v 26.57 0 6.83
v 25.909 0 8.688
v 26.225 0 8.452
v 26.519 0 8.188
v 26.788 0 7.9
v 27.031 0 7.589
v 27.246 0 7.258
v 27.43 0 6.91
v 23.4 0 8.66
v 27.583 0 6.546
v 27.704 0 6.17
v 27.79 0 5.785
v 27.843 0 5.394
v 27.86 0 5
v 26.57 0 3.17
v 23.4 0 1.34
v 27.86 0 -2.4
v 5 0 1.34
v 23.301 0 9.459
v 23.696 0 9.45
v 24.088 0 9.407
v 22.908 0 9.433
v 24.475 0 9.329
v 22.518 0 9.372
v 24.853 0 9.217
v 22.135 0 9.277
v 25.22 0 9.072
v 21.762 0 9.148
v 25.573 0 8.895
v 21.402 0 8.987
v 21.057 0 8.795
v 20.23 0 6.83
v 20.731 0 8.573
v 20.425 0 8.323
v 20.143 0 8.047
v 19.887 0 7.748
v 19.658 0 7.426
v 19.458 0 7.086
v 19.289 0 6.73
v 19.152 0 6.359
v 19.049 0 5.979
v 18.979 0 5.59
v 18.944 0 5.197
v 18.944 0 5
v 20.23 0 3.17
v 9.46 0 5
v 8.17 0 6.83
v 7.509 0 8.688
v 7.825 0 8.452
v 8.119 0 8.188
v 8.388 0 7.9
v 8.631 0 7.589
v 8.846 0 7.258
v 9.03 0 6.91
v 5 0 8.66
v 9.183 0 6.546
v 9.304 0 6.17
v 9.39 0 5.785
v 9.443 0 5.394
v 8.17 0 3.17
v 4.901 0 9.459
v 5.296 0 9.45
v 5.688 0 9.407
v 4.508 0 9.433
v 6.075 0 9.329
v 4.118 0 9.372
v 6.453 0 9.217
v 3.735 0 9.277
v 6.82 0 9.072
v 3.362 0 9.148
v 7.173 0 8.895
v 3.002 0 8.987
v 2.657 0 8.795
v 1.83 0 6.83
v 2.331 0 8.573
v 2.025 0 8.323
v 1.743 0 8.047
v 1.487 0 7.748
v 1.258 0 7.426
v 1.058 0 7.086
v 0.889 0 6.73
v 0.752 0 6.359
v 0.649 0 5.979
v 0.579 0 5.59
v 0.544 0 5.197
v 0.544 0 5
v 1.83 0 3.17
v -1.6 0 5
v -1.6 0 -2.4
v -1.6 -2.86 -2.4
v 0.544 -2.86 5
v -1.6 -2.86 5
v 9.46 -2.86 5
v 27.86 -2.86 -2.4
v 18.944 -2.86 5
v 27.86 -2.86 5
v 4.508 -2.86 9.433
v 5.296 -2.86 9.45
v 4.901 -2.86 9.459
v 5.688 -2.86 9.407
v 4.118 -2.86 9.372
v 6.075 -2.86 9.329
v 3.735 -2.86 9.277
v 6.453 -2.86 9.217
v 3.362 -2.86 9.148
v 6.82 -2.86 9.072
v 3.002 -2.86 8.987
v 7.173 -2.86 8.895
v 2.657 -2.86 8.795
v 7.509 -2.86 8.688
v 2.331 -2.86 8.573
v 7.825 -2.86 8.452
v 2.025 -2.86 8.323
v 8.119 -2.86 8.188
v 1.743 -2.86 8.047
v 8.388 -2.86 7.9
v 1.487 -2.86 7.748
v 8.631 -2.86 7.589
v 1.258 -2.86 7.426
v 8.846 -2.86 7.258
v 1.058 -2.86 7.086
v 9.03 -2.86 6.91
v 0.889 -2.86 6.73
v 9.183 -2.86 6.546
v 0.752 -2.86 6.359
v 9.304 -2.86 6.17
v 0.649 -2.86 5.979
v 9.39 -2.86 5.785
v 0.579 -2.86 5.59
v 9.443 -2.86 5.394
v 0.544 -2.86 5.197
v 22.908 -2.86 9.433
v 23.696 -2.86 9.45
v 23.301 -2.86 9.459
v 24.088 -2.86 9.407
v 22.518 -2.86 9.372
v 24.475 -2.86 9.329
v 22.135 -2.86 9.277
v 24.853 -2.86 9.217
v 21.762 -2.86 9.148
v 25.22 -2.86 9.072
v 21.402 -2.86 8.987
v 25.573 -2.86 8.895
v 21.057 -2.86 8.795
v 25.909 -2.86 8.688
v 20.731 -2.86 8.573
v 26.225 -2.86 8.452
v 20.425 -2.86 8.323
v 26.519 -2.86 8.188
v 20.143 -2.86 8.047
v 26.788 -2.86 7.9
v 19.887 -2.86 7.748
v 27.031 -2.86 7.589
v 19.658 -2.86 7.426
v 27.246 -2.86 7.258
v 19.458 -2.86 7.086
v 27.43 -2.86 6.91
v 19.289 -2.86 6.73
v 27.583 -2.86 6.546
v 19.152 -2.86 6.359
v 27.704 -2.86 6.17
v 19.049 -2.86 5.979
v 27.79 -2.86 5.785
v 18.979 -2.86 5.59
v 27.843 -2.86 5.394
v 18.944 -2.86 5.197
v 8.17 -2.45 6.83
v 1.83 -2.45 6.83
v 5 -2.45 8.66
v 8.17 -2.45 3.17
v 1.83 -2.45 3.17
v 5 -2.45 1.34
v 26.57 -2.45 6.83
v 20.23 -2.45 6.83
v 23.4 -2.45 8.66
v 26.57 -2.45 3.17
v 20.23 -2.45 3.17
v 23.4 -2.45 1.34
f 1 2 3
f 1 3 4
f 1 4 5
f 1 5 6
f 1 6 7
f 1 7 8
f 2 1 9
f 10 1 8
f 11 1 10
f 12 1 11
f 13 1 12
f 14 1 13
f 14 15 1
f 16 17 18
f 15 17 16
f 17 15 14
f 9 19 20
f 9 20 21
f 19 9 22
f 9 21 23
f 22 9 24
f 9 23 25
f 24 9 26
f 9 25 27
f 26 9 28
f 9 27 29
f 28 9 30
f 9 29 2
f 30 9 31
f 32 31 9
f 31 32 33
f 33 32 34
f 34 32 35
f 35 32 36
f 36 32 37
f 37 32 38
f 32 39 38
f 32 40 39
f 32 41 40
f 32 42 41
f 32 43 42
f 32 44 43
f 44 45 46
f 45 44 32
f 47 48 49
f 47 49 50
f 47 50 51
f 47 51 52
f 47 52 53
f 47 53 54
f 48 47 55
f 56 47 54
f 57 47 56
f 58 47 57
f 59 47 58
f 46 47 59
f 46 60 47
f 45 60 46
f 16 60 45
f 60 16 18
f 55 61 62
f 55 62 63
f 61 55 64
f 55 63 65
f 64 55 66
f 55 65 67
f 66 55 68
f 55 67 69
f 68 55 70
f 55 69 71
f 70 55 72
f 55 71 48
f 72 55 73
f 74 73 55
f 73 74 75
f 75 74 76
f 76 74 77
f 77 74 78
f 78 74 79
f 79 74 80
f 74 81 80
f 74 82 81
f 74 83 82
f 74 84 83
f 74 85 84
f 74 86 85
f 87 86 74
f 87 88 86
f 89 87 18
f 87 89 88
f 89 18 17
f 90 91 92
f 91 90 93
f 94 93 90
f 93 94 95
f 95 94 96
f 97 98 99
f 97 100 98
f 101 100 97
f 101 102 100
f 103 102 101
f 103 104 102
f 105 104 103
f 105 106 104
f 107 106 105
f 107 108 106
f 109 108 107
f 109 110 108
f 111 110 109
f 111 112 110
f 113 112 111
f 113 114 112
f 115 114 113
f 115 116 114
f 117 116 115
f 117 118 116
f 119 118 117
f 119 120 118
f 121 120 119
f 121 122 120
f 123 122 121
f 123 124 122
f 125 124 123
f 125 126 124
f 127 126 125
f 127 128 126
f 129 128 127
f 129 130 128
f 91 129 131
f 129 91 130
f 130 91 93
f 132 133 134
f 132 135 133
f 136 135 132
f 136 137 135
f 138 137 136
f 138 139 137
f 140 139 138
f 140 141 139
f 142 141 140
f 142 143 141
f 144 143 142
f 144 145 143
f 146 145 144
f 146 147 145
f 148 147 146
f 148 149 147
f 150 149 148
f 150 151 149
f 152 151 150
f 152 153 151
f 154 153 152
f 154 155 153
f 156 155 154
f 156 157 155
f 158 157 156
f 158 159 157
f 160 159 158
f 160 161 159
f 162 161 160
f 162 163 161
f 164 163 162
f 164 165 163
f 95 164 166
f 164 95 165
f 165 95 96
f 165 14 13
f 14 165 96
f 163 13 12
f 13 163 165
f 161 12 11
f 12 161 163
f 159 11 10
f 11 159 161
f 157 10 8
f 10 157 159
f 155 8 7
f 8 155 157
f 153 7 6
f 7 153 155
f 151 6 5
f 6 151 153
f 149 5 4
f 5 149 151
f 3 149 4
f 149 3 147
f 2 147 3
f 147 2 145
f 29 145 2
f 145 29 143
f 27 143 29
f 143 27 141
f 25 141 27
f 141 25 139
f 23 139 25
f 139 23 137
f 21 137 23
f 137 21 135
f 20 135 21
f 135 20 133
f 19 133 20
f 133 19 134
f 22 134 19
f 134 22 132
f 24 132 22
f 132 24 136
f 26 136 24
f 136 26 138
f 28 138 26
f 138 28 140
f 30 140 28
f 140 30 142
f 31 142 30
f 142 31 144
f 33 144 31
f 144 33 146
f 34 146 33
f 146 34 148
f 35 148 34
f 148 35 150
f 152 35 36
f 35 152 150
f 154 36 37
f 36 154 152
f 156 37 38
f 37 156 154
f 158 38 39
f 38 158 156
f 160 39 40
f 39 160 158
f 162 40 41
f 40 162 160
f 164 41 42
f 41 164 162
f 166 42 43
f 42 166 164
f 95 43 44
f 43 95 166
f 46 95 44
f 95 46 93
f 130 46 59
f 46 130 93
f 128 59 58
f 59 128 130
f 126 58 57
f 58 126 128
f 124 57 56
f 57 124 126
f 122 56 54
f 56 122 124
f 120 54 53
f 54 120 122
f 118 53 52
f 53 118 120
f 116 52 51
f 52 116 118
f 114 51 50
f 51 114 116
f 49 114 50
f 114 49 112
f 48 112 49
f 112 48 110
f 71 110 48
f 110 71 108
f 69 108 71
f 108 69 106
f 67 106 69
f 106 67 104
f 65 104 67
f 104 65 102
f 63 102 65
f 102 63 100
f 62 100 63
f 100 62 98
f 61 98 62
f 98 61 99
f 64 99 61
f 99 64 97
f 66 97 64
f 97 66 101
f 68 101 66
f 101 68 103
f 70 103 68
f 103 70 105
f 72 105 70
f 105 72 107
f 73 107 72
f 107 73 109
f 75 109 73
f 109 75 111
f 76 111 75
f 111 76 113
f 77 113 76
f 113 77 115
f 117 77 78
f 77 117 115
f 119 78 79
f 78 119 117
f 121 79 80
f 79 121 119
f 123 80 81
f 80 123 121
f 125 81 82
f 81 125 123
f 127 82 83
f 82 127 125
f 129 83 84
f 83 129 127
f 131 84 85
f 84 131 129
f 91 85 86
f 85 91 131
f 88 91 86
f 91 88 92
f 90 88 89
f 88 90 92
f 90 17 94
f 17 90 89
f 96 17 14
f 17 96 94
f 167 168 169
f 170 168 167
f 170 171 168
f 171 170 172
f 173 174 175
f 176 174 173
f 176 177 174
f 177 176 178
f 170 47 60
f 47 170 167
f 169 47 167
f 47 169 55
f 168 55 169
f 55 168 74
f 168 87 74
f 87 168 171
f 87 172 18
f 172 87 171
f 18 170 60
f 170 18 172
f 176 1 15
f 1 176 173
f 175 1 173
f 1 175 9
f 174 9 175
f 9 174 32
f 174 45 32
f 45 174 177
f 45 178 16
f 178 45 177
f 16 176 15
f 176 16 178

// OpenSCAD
// Copyright (C) 2025 Arif K. Rafiq
// This program is free software: you can redistribute it and/or modify
// it under the terms of the GNU General Public License as published by
// the Free Software Foundation, either version 3 of the License, or
// (at your option) any later version.

// This program is distributed in the hope that it will be useful,
// but WITHOUT ANY WARRANTY; without even the implied warranty of
// MERCHANTABILITY or FITNESS FOR A PARTICULAR PURPOSE.  See the
// GNU General Public License for more details.

// You should have received a copy of the GNU General Public License
// along with this file.  If not, see <https://www.gnu.org/licenses/>,
// or write to: license@temperedoptimism.com


/* 
(b)readth       :(w)est (X-)   (c)enter (X0) (e)east (X+)
Vectors (v)     :(x), (y), (z)
Thicknesses (t) : Thicknesses to resolve 3D printer limits or rendering issues.
Proportion (p)  : container for grouping (r)adius and (i)ntensity into a singl 2d vector acccessed using .x and .y respectively
*/

// Fixed in example3.scad       // Set limits in customizer
/* [Thicknesses (x),(y),(z)] */
tFitGap = [0.16, 0.16, 0.16];   //[0.00:0.01:0.64] 
tWallMin = [0.40, 0.40, 0.16];  //[0.16:0.08:1.60] 
/* [Proportional (x):(Radius, (y):(i)ntensity] */
pHexSink = [3.5, 2.3];          //[0.10:0.02:20.00] 
/* [2D vectors (x), (y)] */
vTerminalW = [5.0, 5.0];        //[0.00:0.10:100] 
vTerminalE = [23.4, 5.0];       //[0.00:0.10:100] 
/* [Scalars] */
leadingEdge = 2.4; //[0.8:0.4:5.0]
flankEdge = 1.6; //[0.8:0.4:5.0]
bBoard = 28.4; //[20:0.1:100.0]
/* [Special ] */
fa0 = 4.0;     //[1:1:60]  
fs0 = 0.4;     //[0.1:0.1:4.0]  
fx0 = 3;       //[1,2,3,4,5,6,7,8,9,10]
/* [Hidden] */ 
tEps=0.01; 

/* Calucualted at run time. */
pHexSurround = [pHexSink.x + (tWallMin.x * 2) + tFitGap.x, pHexSink.y + tWallMin.y + tFitGap.y];

//30.00-35.00 Circles, Also look at the customizer!!
// Rotate
rotate([90,0,0]){
  difference(){

    linear_extrude(pHexSurround.y, convexity=fx0){ 
      polygon([[vTerminalW.x + pHexSurround.x, vTerminalW.y],
              [ vTerminalW.x + pHexSurround.x, -leadingEdge],
              [-flankEdge, -leadingEdge],       
              [-flankEdge, vTerminalW.y]]);
      translate(vTerminalW)  circle(pHexSurround.x, $fa=fa0, $fs=fs0);
      polygon([[vTerminalE.x + pHexSurround.x, vTerminalE.y],
              [ vTerminalE.x + pHexSurround.x, -leadingEdge],
              [-flankEdge, -leadingEdge],       
              [-flankEdge, vTerminalE.y]]); 
      translate(vTerminalE)  circle(pHexSurround.x, $fa=fa0, $fs=fs0 );
    }
    //hex pocket
    // Solve Conflicting bodies                       
    translate([0,0, -tEps]) linear_extrude(pHexSink.y + tFitGap.y, convexity=fx0){
      translate(vTerminalW)  rotate([0,0,30]) circle(pHexSink.x + tFitGap.y, $fn=6);
      translate(vTerminalE)  rotate([0,0,30]) circle(pHexSink.x + tFitGap.y, $fn=6);
    }
  }
}
